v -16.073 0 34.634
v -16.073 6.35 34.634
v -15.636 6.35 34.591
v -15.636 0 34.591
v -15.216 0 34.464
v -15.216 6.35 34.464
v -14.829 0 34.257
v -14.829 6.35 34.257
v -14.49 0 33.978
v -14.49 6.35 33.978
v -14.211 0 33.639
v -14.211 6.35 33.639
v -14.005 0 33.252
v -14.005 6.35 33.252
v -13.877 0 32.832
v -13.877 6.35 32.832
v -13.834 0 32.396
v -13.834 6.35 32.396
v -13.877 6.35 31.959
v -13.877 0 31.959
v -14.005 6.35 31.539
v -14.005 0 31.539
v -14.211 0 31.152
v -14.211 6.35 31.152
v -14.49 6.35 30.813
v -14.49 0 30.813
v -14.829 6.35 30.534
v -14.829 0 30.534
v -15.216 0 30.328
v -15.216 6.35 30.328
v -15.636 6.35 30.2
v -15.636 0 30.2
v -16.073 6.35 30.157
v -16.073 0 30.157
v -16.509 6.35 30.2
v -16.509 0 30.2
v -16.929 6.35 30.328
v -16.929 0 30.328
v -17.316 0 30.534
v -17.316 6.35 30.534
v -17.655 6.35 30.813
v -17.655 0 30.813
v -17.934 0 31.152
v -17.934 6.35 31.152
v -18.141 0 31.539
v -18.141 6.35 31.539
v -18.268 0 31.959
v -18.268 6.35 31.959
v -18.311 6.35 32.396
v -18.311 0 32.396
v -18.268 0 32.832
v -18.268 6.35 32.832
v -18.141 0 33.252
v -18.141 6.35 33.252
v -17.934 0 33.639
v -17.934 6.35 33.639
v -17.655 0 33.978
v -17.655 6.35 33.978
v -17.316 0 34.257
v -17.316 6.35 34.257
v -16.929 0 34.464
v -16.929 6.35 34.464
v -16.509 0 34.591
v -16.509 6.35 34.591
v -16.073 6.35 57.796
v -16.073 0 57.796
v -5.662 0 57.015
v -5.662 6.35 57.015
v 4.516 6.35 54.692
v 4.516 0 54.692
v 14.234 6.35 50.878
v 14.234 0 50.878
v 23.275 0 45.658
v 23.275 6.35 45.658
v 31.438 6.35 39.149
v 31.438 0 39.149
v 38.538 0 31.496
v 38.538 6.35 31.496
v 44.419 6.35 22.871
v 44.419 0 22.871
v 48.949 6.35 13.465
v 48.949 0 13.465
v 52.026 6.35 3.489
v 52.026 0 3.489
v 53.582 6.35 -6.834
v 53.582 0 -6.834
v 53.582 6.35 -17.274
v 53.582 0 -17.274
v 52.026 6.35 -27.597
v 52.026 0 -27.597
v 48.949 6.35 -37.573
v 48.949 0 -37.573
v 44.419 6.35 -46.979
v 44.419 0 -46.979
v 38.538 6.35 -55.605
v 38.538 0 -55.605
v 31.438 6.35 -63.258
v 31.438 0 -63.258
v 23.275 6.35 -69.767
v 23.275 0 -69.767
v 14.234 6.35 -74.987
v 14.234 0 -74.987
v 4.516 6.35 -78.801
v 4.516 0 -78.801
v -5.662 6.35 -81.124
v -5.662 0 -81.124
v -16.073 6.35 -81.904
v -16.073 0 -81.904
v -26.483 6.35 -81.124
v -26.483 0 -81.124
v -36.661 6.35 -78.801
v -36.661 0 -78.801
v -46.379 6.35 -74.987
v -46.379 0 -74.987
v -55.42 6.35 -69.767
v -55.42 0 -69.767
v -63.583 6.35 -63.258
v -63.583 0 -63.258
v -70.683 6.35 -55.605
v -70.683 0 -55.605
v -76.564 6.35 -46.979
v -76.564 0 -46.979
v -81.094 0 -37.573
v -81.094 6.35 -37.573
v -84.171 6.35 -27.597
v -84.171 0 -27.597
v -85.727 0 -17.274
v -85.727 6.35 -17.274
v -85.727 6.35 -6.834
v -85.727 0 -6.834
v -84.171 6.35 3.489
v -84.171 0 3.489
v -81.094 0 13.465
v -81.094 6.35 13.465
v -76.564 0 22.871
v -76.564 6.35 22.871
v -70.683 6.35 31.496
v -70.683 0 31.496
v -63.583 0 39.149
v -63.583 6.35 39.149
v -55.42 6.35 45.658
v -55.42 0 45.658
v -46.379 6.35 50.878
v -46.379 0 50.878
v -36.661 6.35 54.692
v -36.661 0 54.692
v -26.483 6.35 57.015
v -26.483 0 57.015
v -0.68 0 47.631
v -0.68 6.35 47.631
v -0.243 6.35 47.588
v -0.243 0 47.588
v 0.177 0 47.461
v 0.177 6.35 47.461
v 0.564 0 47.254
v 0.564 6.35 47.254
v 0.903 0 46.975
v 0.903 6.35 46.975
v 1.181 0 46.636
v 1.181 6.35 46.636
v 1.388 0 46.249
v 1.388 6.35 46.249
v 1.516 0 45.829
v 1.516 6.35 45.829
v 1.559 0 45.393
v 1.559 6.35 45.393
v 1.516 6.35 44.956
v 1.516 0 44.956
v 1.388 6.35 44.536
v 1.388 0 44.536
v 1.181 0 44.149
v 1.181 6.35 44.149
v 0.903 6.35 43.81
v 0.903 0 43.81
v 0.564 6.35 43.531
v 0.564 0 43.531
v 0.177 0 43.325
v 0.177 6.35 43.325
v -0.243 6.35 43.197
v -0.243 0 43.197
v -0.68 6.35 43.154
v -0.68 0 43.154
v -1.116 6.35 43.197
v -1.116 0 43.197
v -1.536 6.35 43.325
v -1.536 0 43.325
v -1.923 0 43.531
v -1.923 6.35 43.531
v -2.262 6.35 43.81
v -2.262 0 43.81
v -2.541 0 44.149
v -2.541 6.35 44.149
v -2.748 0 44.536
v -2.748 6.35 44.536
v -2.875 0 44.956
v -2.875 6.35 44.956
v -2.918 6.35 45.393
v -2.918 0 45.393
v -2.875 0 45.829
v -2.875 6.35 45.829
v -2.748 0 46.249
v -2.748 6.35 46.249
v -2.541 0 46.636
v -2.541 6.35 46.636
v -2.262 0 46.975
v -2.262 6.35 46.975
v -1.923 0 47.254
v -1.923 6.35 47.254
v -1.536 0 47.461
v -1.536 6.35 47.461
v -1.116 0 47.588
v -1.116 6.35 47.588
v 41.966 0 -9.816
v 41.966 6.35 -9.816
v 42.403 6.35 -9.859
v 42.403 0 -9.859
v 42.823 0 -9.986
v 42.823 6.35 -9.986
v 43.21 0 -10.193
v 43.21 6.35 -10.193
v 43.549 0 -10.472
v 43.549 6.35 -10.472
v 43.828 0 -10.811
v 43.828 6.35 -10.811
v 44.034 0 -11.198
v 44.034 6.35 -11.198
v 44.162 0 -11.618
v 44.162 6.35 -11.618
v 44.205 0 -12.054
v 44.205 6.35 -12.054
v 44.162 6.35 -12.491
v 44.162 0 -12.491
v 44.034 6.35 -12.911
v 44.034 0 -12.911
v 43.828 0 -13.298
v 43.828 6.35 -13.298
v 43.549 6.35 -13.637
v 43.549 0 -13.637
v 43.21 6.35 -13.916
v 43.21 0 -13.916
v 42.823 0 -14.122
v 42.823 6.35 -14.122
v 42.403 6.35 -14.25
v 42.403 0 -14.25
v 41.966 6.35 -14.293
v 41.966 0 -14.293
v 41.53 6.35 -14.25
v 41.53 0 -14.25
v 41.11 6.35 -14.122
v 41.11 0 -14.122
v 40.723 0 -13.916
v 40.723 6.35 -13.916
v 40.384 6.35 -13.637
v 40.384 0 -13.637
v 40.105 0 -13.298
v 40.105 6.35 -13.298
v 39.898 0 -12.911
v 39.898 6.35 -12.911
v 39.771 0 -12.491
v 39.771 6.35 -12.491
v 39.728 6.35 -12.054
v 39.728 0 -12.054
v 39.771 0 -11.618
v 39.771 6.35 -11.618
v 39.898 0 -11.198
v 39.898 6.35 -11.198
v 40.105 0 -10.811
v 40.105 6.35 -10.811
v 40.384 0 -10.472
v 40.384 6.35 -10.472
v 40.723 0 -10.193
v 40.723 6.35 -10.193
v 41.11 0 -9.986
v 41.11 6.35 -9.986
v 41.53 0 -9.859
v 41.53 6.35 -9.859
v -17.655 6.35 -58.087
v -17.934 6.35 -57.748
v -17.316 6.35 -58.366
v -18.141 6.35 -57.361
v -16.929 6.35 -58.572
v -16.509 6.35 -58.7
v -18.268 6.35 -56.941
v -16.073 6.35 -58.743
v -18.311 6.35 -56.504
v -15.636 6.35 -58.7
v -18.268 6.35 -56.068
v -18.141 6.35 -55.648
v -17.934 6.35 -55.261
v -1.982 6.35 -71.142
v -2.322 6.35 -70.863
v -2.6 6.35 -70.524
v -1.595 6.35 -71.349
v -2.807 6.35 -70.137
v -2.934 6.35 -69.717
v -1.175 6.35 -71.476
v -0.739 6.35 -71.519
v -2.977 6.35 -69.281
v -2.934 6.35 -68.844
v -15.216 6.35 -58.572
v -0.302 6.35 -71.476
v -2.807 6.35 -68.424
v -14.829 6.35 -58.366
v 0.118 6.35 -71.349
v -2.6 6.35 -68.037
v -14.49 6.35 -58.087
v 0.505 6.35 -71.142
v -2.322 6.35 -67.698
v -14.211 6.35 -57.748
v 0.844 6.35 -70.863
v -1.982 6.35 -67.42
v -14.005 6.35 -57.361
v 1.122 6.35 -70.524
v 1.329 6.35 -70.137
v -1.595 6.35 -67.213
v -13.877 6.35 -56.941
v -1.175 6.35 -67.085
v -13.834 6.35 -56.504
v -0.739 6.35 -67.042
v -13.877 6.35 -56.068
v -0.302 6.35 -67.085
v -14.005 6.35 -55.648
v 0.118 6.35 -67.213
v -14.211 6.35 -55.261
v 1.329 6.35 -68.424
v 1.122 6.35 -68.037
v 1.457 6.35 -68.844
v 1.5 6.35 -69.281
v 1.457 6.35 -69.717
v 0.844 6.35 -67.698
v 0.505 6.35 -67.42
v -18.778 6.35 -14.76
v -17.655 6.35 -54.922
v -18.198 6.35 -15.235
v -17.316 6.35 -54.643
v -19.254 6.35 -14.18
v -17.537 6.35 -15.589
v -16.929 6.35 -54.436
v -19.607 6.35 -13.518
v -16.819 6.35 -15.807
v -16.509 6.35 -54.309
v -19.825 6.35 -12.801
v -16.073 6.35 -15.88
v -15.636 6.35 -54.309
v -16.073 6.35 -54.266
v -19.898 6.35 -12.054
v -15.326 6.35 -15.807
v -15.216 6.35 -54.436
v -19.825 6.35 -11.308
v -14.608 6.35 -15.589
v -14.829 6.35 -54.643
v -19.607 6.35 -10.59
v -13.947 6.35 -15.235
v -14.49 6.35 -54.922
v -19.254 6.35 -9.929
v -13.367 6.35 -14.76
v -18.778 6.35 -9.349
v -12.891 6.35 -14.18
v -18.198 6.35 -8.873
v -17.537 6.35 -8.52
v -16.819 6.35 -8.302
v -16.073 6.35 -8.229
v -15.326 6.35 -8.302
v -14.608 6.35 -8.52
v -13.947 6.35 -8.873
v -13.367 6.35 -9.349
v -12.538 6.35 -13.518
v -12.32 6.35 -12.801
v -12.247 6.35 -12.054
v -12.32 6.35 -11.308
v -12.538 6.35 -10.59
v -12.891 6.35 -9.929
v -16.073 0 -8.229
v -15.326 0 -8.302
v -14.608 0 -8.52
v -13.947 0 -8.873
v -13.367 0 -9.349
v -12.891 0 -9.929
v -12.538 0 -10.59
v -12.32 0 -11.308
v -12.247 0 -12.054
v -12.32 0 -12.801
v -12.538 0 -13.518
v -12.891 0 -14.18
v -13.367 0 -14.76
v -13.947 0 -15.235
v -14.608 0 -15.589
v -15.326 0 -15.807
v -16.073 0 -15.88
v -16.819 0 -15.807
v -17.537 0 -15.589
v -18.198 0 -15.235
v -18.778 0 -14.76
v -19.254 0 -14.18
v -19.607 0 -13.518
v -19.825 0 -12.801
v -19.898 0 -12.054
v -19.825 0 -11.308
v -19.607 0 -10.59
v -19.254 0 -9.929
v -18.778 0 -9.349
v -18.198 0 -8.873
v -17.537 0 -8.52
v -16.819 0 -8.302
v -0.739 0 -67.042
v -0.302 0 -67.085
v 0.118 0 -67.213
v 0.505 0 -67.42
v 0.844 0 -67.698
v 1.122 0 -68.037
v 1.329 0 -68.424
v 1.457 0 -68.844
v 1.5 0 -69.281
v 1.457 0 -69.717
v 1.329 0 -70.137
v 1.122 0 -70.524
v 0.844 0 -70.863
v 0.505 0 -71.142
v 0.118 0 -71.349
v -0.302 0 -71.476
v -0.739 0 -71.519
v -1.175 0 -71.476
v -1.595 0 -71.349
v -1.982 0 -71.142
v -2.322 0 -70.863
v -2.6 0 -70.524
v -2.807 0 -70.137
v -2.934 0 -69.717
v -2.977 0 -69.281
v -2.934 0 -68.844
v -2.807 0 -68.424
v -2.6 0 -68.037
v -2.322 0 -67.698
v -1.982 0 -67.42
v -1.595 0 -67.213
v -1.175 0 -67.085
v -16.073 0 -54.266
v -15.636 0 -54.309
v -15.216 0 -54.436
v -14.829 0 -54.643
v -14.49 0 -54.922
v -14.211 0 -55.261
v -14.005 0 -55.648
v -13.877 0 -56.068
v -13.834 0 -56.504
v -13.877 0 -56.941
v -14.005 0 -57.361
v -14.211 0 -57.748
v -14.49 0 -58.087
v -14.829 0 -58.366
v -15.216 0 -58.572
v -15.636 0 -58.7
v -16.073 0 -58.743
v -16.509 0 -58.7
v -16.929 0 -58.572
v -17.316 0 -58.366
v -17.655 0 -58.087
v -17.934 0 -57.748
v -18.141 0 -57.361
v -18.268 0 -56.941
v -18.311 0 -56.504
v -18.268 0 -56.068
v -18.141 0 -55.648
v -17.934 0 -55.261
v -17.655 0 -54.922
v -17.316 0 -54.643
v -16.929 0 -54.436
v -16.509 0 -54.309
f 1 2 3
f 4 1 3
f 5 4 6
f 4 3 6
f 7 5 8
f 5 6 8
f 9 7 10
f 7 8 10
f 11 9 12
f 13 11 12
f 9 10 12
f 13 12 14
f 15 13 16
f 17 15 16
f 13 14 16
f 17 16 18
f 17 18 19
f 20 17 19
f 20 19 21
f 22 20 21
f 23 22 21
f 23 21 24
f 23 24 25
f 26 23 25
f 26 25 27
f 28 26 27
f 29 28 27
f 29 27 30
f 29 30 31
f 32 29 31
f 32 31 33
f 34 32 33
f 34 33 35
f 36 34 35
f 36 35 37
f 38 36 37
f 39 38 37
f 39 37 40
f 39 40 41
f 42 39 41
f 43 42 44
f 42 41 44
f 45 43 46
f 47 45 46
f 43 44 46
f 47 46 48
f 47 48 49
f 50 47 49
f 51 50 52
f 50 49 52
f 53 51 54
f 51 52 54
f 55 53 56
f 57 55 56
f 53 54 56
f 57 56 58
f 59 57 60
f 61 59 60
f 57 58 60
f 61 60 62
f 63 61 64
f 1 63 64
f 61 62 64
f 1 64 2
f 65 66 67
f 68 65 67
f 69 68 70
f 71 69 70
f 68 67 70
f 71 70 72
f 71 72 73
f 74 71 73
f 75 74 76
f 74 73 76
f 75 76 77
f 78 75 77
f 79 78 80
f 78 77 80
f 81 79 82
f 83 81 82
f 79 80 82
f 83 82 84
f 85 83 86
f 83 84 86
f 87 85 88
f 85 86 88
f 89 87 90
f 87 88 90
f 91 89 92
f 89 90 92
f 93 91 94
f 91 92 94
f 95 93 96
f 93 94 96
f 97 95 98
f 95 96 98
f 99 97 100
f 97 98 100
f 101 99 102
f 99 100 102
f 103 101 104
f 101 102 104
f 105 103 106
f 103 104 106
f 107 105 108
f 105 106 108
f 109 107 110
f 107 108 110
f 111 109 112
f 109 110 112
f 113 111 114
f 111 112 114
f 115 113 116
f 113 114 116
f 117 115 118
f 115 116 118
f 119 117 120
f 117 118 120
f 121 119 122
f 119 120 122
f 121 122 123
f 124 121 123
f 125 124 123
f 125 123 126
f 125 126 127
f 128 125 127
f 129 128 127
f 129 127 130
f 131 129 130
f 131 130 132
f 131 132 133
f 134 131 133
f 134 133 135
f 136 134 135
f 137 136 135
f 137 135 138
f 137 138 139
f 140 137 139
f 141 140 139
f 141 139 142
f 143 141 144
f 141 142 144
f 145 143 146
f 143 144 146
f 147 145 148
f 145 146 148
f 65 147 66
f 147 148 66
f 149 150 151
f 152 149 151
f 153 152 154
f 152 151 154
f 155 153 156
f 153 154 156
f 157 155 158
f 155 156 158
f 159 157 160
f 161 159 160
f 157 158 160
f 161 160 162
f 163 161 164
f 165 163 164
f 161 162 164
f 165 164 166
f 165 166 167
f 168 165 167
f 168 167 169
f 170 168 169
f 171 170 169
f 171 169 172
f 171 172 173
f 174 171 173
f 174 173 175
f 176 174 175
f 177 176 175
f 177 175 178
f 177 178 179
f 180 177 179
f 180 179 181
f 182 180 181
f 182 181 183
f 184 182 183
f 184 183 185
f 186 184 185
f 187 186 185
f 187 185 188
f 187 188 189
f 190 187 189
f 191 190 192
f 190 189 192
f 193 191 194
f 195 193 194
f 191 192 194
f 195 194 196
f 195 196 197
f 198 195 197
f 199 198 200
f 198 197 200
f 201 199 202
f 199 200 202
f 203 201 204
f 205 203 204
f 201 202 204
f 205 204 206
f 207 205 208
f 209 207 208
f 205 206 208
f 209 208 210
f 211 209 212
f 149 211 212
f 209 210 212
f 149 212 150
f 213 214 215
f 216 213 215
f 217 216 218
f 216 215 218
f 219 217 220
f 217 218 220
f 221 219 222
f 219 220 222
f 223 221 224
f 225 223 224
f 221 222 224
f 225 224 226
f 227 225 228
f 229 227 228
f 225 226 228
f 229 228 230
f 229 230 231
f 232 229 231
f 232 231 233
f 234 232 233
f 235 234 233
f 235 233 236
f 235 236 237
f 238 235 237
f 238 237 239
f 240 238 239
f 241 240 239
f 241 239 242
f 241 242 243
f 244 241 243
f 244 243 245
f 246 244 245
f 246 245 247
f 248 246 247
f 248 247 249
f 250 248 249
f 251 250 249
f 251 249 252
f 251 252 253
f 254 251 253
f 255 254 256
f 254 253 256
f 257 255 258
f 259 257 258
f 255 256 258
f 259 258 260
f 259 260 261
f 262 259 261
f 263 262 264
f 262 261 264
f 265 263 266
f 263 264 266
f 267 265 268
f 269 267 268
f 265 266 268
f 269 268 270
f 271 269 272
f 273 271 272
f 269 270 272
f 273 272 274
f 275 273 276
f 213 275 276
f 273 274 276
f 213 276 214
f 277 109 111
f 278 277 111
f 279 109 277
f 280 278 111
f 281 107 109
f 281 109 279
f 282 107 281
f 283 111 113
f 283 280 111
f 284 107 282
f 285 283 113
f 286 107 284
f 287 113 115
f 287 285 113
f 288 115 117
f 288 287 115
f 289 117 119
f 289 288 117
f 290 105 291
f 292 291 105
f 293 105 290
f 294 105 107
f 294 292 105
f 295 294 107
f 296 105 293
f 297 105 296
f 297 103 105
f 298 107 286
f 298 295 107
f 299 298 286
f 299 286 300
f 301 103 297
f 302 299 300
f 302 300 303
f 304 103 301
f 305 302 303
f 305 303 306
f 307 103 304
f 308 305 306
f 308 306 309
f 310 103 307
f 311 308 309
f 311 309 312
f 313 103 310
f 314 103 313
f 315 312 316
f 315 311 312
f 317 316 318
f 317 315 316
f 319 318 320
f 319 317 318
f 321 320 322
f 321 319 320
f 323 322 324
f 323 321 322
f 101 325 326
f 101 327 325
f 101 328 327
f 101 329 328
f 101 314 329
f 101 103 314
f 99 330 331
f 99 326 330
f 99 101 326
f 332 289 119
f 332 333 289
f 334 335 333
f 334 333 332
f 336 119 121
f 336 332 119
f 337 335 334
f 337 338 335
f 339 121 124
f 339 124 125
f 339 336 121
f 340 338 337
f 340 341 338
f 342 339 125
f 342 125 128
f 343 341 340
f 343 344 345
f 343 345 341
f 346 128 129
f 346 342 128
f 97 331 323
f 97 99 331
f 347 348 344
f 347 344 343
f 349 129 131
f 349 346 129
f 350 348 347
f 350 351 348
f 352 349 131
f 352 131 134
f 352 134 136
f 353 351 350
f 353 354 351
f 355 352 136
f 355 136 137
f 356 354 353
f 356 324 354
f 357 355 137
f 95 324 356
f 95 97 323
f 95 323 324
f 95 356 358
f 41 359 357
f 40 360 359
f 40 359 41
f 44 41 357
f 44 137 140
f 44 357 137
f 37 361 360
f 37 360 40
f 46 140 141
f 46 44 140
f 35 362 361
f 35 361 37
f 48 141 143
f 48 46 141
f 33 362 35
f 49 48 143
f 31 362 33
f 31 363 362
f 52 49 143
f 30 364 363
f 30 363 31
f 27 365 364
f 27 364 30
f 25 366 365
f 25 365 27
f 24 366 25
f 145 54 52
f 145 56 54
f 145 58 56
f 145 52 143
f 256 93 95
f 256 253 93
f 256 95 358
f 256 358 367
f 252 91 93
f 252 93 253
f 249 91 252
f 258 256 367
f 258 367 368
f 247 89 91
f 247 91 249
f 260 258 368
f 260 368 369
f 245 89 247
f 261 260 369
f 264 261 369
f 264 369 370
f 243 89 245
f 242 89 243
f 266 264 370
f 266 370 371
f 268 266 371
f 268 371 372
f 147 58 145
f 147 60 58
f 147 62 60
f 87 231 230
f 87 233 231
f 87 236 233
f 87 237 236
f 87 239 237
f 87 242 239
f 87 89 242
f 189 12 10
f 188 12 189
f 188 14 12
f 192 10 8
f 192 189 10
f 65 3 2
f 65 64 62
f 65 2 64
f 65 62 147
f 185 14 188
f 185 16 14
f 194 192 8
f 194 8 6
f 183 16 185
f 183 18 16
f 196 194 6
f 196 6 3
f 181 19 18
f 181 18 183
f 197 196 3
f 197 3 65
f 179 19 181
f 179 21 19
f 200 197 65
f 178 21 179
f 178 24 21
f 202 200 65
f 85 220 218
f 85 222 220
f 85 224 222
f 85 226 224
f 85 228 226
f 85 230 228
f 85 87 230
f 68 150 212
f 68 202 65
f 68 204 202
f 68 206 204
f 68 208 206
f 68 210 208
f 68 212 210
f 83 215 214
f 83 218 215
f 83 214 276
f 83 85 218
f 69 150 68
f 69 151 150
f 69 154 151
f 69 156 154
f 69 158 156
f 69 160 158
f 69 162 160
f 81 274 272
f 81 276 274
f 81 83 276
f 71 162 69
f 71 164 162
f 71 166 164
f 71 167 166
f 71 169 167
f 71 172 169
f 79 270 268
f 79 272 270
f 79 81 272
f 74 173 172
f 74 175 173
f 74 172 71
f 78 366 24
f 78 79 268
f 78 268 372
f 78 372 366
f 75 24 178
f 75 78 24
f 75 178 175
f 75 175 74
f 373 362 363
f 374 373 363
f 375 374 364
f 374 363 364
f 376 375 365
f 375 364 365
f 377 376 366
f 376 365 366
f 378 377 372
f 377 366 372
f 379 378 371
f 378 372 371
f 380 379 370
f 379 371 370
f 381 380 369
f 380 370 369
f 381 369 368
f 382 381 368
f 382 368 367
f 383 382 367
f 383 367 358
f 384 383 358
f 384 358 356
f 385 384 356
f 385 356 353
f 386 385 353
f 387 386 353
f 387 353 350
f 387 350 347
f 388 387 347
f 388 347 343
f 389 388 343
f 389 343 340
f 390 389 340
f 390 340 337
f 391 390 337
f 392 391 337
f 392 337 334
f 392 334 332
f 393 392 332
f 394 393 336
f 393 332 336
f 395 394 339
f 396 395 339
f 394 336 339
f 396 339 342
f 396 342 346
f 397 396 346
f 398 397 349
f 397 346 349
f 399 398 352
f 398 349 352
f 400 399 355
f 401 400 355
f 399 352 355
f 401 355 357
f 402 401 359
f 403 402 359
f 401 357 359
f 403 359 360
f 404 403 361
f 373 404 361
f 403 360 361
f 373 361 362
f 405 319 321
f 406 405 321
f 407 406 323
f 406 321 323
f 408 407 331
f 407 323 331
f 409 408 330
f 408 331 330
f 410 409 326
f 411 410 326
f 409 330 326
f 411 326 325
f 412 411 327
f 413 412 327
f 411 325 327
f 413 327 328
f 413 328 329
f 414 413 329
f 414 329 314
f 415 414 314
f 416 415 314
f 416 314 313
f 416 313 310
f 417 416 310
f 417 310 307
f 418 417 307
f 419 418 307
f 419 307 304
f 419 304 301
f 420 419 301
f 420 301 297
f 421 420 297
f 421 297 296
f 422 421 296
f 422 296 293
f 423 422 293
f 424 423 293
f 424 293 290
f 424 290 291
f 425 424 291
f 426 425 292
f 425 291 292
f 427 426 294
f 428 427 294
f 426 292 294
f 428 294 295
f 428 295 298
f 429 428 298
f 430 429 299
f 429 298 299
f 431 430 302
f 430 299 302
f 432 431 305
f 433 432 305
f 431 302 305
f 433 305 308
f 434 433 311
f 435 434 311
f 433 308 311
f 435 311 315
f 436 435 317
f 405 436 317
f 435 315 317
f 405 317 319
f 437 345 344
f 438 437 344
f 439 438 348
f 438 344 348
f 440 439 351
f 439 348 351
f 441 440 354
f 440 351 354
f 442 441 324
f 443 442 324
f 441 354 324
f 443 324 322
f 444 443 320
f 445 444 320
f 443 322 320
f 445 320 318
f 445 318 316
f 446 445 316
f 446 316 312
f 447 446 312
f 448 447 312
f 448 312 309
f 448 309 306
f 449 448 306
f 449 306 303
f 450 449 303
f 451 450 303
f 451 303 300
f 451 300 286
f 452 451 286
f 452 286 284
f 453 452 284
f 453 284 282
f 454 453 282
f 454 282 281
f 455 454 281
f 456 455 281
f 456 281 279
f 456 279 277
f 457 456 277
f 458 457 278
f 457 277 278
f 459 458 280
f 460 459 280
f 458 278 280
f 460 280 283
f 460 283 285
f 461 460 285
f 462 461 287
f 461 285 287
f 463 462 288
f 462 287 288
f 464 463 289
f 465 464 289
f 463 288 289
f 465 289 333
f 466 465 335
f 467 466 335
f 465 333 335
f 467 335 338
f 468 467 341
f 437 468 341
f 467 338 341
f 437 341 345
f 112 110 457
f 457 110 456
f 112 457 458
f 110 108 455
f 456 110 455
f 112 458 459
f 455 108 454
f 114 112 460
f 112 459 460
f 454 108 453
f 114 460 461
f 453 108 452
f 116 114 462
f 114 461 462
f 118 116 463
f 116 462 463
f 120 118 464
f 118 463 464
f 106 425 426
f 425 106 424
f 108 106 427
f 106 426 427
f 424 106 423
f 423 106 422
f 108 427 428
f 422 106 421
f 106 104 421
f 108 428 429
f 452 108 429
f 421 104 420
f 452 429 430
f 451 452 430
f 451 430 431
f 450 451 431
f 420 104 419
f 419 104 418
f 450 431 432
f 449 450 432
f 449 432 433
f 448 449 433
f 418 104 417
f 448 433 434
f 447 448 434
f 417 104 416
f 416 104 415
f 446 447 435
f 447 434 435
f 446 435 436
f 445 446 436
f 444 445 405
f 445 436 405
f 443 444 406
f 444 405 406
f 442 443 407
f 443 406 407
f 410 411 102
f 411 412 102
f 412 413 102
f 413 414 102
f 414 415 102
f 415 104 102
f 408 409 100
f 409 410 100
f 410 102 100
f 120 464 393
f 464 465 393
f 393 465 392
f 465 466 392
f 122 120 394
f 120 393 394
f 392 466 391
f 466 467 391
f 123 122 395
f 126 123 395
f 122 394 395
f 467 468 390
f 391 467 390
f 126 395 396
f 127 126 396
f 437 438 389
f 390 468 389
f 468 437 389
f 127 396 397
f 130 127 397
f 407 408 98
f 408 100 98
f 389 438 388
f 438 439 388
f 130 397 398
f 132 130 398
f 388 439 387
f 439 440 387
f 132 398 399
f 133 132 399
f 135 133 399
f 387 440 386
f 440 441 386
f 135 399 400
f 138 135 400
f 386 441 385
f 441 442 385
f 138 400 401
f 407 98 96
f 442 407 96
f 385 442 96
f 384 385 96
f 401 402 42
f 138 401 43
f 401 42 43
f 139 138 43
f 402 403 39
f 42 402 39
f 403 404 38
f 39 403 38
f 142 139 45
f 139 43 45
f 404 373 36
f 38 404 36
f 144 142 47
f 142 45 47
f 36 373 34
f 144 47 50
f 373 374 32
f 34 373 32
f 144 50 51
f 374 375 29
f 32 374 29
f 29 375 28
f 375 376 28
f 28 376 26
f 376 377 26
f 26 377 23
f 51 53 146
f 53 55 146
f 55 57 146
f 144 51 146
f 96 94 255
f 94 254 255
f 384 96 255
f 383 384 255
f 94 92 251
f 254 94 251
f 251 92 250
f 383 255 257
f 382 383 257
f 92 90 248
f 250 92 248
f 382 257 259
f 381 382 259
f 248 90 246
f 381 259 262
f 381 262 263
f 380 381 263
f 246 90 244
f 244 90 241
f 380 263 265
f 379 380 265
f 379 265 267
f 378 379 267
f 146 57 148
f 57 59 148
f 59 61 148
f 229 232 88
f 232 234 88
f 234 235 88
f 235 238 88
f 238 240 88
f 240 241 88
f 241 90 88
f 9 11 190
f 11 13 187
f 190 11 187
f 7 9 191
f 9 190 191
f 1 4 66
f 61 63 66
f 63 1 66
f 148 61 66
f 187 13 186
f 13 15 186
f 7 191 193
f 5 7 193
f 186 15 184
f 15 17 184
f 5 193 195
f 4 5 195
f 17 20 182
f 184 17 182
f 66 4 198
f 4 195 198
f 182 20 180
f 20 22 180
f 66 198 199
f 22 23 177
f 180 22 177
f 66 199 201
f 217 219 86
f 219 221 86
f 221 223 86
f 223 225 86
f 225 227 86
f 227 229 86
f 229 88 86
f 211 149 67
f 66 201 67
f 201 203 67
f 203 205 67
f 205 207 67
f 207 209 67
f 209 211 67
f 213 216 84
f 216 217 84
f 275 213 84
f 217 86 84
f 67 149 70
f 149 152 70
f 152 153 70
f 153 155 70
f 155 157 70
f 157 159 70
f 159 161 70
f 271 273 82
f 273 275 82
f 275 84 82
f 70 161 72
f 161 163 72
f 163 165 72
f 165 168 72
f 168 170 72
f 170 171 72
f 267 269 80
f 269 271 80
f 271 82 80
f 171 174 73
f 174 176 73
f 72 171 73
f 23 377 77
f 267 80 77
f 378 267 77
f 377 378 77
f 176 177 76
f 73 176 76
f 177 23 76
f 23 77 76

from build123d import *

# Parameters (mm, degrees)
SKETCH1_R           = 69.85
BOSS_EXTRUDE1_DEPTH = 6.35
SKETCH5_R           = 2.238375
SKETCH5_R_2         = 3.825875
CUT_EXTRUDE3_DEPTH  = 12.7


with BuildPart() as part:
    # Sketch1 → Boss-Extrude1 (new body)
    with BuildSketch(Plane(origin=(0, 0, 0), x_dir=(1, 0, 0), z_dir=(0, 1, 0))):
        with Locations(Location((-16.072515175, 12.054386381, 0), (0, 0, 270))):
            Circle(SKETCH1_R)
    extrude(amount=BOSS_EXTRUDE1_DEPTH)

    # Sketch5 → Cut-Extrude3 (cut)
    with BuildSketch(Plane(origin=(0, 6.35, 0), x_dir=(1, 0, 0), z_dir=(0, 1, 0))):
        with Locations(Location((-0.738778166, 69.280671968, 0), (0, 0, 270))):
            Circle(SKETCH5_R)
        with Locations(Location((-16.072515175, 56.504386381, 0), (0, 0, 270))):
            Circle(SKETCH5_R)
        with Locations(Location((-16.072515175, 12.054386381, 0), (0, 0, 270))):
            Circle(SKETCH5_R_2)
        with Locations(Location((-16.072515175, -32.395613619, 0), (0, 0, 270))):
            Circle(SKETCH5_R)
        with Locations(Location((-0.679642183, -45.392597698, 0), (0, 0, 270))):
            Circle(SKETCH5_R)
        with Locations(Location((41.966484825, 12.054386381, 0), (0, 0, 270))):
            Circle(SKETCH5_R)
    extrude(amount=-CUT_EXTRUDE3_DEPTH, mode=Mode.SUBTRACT)


solid = part.part
